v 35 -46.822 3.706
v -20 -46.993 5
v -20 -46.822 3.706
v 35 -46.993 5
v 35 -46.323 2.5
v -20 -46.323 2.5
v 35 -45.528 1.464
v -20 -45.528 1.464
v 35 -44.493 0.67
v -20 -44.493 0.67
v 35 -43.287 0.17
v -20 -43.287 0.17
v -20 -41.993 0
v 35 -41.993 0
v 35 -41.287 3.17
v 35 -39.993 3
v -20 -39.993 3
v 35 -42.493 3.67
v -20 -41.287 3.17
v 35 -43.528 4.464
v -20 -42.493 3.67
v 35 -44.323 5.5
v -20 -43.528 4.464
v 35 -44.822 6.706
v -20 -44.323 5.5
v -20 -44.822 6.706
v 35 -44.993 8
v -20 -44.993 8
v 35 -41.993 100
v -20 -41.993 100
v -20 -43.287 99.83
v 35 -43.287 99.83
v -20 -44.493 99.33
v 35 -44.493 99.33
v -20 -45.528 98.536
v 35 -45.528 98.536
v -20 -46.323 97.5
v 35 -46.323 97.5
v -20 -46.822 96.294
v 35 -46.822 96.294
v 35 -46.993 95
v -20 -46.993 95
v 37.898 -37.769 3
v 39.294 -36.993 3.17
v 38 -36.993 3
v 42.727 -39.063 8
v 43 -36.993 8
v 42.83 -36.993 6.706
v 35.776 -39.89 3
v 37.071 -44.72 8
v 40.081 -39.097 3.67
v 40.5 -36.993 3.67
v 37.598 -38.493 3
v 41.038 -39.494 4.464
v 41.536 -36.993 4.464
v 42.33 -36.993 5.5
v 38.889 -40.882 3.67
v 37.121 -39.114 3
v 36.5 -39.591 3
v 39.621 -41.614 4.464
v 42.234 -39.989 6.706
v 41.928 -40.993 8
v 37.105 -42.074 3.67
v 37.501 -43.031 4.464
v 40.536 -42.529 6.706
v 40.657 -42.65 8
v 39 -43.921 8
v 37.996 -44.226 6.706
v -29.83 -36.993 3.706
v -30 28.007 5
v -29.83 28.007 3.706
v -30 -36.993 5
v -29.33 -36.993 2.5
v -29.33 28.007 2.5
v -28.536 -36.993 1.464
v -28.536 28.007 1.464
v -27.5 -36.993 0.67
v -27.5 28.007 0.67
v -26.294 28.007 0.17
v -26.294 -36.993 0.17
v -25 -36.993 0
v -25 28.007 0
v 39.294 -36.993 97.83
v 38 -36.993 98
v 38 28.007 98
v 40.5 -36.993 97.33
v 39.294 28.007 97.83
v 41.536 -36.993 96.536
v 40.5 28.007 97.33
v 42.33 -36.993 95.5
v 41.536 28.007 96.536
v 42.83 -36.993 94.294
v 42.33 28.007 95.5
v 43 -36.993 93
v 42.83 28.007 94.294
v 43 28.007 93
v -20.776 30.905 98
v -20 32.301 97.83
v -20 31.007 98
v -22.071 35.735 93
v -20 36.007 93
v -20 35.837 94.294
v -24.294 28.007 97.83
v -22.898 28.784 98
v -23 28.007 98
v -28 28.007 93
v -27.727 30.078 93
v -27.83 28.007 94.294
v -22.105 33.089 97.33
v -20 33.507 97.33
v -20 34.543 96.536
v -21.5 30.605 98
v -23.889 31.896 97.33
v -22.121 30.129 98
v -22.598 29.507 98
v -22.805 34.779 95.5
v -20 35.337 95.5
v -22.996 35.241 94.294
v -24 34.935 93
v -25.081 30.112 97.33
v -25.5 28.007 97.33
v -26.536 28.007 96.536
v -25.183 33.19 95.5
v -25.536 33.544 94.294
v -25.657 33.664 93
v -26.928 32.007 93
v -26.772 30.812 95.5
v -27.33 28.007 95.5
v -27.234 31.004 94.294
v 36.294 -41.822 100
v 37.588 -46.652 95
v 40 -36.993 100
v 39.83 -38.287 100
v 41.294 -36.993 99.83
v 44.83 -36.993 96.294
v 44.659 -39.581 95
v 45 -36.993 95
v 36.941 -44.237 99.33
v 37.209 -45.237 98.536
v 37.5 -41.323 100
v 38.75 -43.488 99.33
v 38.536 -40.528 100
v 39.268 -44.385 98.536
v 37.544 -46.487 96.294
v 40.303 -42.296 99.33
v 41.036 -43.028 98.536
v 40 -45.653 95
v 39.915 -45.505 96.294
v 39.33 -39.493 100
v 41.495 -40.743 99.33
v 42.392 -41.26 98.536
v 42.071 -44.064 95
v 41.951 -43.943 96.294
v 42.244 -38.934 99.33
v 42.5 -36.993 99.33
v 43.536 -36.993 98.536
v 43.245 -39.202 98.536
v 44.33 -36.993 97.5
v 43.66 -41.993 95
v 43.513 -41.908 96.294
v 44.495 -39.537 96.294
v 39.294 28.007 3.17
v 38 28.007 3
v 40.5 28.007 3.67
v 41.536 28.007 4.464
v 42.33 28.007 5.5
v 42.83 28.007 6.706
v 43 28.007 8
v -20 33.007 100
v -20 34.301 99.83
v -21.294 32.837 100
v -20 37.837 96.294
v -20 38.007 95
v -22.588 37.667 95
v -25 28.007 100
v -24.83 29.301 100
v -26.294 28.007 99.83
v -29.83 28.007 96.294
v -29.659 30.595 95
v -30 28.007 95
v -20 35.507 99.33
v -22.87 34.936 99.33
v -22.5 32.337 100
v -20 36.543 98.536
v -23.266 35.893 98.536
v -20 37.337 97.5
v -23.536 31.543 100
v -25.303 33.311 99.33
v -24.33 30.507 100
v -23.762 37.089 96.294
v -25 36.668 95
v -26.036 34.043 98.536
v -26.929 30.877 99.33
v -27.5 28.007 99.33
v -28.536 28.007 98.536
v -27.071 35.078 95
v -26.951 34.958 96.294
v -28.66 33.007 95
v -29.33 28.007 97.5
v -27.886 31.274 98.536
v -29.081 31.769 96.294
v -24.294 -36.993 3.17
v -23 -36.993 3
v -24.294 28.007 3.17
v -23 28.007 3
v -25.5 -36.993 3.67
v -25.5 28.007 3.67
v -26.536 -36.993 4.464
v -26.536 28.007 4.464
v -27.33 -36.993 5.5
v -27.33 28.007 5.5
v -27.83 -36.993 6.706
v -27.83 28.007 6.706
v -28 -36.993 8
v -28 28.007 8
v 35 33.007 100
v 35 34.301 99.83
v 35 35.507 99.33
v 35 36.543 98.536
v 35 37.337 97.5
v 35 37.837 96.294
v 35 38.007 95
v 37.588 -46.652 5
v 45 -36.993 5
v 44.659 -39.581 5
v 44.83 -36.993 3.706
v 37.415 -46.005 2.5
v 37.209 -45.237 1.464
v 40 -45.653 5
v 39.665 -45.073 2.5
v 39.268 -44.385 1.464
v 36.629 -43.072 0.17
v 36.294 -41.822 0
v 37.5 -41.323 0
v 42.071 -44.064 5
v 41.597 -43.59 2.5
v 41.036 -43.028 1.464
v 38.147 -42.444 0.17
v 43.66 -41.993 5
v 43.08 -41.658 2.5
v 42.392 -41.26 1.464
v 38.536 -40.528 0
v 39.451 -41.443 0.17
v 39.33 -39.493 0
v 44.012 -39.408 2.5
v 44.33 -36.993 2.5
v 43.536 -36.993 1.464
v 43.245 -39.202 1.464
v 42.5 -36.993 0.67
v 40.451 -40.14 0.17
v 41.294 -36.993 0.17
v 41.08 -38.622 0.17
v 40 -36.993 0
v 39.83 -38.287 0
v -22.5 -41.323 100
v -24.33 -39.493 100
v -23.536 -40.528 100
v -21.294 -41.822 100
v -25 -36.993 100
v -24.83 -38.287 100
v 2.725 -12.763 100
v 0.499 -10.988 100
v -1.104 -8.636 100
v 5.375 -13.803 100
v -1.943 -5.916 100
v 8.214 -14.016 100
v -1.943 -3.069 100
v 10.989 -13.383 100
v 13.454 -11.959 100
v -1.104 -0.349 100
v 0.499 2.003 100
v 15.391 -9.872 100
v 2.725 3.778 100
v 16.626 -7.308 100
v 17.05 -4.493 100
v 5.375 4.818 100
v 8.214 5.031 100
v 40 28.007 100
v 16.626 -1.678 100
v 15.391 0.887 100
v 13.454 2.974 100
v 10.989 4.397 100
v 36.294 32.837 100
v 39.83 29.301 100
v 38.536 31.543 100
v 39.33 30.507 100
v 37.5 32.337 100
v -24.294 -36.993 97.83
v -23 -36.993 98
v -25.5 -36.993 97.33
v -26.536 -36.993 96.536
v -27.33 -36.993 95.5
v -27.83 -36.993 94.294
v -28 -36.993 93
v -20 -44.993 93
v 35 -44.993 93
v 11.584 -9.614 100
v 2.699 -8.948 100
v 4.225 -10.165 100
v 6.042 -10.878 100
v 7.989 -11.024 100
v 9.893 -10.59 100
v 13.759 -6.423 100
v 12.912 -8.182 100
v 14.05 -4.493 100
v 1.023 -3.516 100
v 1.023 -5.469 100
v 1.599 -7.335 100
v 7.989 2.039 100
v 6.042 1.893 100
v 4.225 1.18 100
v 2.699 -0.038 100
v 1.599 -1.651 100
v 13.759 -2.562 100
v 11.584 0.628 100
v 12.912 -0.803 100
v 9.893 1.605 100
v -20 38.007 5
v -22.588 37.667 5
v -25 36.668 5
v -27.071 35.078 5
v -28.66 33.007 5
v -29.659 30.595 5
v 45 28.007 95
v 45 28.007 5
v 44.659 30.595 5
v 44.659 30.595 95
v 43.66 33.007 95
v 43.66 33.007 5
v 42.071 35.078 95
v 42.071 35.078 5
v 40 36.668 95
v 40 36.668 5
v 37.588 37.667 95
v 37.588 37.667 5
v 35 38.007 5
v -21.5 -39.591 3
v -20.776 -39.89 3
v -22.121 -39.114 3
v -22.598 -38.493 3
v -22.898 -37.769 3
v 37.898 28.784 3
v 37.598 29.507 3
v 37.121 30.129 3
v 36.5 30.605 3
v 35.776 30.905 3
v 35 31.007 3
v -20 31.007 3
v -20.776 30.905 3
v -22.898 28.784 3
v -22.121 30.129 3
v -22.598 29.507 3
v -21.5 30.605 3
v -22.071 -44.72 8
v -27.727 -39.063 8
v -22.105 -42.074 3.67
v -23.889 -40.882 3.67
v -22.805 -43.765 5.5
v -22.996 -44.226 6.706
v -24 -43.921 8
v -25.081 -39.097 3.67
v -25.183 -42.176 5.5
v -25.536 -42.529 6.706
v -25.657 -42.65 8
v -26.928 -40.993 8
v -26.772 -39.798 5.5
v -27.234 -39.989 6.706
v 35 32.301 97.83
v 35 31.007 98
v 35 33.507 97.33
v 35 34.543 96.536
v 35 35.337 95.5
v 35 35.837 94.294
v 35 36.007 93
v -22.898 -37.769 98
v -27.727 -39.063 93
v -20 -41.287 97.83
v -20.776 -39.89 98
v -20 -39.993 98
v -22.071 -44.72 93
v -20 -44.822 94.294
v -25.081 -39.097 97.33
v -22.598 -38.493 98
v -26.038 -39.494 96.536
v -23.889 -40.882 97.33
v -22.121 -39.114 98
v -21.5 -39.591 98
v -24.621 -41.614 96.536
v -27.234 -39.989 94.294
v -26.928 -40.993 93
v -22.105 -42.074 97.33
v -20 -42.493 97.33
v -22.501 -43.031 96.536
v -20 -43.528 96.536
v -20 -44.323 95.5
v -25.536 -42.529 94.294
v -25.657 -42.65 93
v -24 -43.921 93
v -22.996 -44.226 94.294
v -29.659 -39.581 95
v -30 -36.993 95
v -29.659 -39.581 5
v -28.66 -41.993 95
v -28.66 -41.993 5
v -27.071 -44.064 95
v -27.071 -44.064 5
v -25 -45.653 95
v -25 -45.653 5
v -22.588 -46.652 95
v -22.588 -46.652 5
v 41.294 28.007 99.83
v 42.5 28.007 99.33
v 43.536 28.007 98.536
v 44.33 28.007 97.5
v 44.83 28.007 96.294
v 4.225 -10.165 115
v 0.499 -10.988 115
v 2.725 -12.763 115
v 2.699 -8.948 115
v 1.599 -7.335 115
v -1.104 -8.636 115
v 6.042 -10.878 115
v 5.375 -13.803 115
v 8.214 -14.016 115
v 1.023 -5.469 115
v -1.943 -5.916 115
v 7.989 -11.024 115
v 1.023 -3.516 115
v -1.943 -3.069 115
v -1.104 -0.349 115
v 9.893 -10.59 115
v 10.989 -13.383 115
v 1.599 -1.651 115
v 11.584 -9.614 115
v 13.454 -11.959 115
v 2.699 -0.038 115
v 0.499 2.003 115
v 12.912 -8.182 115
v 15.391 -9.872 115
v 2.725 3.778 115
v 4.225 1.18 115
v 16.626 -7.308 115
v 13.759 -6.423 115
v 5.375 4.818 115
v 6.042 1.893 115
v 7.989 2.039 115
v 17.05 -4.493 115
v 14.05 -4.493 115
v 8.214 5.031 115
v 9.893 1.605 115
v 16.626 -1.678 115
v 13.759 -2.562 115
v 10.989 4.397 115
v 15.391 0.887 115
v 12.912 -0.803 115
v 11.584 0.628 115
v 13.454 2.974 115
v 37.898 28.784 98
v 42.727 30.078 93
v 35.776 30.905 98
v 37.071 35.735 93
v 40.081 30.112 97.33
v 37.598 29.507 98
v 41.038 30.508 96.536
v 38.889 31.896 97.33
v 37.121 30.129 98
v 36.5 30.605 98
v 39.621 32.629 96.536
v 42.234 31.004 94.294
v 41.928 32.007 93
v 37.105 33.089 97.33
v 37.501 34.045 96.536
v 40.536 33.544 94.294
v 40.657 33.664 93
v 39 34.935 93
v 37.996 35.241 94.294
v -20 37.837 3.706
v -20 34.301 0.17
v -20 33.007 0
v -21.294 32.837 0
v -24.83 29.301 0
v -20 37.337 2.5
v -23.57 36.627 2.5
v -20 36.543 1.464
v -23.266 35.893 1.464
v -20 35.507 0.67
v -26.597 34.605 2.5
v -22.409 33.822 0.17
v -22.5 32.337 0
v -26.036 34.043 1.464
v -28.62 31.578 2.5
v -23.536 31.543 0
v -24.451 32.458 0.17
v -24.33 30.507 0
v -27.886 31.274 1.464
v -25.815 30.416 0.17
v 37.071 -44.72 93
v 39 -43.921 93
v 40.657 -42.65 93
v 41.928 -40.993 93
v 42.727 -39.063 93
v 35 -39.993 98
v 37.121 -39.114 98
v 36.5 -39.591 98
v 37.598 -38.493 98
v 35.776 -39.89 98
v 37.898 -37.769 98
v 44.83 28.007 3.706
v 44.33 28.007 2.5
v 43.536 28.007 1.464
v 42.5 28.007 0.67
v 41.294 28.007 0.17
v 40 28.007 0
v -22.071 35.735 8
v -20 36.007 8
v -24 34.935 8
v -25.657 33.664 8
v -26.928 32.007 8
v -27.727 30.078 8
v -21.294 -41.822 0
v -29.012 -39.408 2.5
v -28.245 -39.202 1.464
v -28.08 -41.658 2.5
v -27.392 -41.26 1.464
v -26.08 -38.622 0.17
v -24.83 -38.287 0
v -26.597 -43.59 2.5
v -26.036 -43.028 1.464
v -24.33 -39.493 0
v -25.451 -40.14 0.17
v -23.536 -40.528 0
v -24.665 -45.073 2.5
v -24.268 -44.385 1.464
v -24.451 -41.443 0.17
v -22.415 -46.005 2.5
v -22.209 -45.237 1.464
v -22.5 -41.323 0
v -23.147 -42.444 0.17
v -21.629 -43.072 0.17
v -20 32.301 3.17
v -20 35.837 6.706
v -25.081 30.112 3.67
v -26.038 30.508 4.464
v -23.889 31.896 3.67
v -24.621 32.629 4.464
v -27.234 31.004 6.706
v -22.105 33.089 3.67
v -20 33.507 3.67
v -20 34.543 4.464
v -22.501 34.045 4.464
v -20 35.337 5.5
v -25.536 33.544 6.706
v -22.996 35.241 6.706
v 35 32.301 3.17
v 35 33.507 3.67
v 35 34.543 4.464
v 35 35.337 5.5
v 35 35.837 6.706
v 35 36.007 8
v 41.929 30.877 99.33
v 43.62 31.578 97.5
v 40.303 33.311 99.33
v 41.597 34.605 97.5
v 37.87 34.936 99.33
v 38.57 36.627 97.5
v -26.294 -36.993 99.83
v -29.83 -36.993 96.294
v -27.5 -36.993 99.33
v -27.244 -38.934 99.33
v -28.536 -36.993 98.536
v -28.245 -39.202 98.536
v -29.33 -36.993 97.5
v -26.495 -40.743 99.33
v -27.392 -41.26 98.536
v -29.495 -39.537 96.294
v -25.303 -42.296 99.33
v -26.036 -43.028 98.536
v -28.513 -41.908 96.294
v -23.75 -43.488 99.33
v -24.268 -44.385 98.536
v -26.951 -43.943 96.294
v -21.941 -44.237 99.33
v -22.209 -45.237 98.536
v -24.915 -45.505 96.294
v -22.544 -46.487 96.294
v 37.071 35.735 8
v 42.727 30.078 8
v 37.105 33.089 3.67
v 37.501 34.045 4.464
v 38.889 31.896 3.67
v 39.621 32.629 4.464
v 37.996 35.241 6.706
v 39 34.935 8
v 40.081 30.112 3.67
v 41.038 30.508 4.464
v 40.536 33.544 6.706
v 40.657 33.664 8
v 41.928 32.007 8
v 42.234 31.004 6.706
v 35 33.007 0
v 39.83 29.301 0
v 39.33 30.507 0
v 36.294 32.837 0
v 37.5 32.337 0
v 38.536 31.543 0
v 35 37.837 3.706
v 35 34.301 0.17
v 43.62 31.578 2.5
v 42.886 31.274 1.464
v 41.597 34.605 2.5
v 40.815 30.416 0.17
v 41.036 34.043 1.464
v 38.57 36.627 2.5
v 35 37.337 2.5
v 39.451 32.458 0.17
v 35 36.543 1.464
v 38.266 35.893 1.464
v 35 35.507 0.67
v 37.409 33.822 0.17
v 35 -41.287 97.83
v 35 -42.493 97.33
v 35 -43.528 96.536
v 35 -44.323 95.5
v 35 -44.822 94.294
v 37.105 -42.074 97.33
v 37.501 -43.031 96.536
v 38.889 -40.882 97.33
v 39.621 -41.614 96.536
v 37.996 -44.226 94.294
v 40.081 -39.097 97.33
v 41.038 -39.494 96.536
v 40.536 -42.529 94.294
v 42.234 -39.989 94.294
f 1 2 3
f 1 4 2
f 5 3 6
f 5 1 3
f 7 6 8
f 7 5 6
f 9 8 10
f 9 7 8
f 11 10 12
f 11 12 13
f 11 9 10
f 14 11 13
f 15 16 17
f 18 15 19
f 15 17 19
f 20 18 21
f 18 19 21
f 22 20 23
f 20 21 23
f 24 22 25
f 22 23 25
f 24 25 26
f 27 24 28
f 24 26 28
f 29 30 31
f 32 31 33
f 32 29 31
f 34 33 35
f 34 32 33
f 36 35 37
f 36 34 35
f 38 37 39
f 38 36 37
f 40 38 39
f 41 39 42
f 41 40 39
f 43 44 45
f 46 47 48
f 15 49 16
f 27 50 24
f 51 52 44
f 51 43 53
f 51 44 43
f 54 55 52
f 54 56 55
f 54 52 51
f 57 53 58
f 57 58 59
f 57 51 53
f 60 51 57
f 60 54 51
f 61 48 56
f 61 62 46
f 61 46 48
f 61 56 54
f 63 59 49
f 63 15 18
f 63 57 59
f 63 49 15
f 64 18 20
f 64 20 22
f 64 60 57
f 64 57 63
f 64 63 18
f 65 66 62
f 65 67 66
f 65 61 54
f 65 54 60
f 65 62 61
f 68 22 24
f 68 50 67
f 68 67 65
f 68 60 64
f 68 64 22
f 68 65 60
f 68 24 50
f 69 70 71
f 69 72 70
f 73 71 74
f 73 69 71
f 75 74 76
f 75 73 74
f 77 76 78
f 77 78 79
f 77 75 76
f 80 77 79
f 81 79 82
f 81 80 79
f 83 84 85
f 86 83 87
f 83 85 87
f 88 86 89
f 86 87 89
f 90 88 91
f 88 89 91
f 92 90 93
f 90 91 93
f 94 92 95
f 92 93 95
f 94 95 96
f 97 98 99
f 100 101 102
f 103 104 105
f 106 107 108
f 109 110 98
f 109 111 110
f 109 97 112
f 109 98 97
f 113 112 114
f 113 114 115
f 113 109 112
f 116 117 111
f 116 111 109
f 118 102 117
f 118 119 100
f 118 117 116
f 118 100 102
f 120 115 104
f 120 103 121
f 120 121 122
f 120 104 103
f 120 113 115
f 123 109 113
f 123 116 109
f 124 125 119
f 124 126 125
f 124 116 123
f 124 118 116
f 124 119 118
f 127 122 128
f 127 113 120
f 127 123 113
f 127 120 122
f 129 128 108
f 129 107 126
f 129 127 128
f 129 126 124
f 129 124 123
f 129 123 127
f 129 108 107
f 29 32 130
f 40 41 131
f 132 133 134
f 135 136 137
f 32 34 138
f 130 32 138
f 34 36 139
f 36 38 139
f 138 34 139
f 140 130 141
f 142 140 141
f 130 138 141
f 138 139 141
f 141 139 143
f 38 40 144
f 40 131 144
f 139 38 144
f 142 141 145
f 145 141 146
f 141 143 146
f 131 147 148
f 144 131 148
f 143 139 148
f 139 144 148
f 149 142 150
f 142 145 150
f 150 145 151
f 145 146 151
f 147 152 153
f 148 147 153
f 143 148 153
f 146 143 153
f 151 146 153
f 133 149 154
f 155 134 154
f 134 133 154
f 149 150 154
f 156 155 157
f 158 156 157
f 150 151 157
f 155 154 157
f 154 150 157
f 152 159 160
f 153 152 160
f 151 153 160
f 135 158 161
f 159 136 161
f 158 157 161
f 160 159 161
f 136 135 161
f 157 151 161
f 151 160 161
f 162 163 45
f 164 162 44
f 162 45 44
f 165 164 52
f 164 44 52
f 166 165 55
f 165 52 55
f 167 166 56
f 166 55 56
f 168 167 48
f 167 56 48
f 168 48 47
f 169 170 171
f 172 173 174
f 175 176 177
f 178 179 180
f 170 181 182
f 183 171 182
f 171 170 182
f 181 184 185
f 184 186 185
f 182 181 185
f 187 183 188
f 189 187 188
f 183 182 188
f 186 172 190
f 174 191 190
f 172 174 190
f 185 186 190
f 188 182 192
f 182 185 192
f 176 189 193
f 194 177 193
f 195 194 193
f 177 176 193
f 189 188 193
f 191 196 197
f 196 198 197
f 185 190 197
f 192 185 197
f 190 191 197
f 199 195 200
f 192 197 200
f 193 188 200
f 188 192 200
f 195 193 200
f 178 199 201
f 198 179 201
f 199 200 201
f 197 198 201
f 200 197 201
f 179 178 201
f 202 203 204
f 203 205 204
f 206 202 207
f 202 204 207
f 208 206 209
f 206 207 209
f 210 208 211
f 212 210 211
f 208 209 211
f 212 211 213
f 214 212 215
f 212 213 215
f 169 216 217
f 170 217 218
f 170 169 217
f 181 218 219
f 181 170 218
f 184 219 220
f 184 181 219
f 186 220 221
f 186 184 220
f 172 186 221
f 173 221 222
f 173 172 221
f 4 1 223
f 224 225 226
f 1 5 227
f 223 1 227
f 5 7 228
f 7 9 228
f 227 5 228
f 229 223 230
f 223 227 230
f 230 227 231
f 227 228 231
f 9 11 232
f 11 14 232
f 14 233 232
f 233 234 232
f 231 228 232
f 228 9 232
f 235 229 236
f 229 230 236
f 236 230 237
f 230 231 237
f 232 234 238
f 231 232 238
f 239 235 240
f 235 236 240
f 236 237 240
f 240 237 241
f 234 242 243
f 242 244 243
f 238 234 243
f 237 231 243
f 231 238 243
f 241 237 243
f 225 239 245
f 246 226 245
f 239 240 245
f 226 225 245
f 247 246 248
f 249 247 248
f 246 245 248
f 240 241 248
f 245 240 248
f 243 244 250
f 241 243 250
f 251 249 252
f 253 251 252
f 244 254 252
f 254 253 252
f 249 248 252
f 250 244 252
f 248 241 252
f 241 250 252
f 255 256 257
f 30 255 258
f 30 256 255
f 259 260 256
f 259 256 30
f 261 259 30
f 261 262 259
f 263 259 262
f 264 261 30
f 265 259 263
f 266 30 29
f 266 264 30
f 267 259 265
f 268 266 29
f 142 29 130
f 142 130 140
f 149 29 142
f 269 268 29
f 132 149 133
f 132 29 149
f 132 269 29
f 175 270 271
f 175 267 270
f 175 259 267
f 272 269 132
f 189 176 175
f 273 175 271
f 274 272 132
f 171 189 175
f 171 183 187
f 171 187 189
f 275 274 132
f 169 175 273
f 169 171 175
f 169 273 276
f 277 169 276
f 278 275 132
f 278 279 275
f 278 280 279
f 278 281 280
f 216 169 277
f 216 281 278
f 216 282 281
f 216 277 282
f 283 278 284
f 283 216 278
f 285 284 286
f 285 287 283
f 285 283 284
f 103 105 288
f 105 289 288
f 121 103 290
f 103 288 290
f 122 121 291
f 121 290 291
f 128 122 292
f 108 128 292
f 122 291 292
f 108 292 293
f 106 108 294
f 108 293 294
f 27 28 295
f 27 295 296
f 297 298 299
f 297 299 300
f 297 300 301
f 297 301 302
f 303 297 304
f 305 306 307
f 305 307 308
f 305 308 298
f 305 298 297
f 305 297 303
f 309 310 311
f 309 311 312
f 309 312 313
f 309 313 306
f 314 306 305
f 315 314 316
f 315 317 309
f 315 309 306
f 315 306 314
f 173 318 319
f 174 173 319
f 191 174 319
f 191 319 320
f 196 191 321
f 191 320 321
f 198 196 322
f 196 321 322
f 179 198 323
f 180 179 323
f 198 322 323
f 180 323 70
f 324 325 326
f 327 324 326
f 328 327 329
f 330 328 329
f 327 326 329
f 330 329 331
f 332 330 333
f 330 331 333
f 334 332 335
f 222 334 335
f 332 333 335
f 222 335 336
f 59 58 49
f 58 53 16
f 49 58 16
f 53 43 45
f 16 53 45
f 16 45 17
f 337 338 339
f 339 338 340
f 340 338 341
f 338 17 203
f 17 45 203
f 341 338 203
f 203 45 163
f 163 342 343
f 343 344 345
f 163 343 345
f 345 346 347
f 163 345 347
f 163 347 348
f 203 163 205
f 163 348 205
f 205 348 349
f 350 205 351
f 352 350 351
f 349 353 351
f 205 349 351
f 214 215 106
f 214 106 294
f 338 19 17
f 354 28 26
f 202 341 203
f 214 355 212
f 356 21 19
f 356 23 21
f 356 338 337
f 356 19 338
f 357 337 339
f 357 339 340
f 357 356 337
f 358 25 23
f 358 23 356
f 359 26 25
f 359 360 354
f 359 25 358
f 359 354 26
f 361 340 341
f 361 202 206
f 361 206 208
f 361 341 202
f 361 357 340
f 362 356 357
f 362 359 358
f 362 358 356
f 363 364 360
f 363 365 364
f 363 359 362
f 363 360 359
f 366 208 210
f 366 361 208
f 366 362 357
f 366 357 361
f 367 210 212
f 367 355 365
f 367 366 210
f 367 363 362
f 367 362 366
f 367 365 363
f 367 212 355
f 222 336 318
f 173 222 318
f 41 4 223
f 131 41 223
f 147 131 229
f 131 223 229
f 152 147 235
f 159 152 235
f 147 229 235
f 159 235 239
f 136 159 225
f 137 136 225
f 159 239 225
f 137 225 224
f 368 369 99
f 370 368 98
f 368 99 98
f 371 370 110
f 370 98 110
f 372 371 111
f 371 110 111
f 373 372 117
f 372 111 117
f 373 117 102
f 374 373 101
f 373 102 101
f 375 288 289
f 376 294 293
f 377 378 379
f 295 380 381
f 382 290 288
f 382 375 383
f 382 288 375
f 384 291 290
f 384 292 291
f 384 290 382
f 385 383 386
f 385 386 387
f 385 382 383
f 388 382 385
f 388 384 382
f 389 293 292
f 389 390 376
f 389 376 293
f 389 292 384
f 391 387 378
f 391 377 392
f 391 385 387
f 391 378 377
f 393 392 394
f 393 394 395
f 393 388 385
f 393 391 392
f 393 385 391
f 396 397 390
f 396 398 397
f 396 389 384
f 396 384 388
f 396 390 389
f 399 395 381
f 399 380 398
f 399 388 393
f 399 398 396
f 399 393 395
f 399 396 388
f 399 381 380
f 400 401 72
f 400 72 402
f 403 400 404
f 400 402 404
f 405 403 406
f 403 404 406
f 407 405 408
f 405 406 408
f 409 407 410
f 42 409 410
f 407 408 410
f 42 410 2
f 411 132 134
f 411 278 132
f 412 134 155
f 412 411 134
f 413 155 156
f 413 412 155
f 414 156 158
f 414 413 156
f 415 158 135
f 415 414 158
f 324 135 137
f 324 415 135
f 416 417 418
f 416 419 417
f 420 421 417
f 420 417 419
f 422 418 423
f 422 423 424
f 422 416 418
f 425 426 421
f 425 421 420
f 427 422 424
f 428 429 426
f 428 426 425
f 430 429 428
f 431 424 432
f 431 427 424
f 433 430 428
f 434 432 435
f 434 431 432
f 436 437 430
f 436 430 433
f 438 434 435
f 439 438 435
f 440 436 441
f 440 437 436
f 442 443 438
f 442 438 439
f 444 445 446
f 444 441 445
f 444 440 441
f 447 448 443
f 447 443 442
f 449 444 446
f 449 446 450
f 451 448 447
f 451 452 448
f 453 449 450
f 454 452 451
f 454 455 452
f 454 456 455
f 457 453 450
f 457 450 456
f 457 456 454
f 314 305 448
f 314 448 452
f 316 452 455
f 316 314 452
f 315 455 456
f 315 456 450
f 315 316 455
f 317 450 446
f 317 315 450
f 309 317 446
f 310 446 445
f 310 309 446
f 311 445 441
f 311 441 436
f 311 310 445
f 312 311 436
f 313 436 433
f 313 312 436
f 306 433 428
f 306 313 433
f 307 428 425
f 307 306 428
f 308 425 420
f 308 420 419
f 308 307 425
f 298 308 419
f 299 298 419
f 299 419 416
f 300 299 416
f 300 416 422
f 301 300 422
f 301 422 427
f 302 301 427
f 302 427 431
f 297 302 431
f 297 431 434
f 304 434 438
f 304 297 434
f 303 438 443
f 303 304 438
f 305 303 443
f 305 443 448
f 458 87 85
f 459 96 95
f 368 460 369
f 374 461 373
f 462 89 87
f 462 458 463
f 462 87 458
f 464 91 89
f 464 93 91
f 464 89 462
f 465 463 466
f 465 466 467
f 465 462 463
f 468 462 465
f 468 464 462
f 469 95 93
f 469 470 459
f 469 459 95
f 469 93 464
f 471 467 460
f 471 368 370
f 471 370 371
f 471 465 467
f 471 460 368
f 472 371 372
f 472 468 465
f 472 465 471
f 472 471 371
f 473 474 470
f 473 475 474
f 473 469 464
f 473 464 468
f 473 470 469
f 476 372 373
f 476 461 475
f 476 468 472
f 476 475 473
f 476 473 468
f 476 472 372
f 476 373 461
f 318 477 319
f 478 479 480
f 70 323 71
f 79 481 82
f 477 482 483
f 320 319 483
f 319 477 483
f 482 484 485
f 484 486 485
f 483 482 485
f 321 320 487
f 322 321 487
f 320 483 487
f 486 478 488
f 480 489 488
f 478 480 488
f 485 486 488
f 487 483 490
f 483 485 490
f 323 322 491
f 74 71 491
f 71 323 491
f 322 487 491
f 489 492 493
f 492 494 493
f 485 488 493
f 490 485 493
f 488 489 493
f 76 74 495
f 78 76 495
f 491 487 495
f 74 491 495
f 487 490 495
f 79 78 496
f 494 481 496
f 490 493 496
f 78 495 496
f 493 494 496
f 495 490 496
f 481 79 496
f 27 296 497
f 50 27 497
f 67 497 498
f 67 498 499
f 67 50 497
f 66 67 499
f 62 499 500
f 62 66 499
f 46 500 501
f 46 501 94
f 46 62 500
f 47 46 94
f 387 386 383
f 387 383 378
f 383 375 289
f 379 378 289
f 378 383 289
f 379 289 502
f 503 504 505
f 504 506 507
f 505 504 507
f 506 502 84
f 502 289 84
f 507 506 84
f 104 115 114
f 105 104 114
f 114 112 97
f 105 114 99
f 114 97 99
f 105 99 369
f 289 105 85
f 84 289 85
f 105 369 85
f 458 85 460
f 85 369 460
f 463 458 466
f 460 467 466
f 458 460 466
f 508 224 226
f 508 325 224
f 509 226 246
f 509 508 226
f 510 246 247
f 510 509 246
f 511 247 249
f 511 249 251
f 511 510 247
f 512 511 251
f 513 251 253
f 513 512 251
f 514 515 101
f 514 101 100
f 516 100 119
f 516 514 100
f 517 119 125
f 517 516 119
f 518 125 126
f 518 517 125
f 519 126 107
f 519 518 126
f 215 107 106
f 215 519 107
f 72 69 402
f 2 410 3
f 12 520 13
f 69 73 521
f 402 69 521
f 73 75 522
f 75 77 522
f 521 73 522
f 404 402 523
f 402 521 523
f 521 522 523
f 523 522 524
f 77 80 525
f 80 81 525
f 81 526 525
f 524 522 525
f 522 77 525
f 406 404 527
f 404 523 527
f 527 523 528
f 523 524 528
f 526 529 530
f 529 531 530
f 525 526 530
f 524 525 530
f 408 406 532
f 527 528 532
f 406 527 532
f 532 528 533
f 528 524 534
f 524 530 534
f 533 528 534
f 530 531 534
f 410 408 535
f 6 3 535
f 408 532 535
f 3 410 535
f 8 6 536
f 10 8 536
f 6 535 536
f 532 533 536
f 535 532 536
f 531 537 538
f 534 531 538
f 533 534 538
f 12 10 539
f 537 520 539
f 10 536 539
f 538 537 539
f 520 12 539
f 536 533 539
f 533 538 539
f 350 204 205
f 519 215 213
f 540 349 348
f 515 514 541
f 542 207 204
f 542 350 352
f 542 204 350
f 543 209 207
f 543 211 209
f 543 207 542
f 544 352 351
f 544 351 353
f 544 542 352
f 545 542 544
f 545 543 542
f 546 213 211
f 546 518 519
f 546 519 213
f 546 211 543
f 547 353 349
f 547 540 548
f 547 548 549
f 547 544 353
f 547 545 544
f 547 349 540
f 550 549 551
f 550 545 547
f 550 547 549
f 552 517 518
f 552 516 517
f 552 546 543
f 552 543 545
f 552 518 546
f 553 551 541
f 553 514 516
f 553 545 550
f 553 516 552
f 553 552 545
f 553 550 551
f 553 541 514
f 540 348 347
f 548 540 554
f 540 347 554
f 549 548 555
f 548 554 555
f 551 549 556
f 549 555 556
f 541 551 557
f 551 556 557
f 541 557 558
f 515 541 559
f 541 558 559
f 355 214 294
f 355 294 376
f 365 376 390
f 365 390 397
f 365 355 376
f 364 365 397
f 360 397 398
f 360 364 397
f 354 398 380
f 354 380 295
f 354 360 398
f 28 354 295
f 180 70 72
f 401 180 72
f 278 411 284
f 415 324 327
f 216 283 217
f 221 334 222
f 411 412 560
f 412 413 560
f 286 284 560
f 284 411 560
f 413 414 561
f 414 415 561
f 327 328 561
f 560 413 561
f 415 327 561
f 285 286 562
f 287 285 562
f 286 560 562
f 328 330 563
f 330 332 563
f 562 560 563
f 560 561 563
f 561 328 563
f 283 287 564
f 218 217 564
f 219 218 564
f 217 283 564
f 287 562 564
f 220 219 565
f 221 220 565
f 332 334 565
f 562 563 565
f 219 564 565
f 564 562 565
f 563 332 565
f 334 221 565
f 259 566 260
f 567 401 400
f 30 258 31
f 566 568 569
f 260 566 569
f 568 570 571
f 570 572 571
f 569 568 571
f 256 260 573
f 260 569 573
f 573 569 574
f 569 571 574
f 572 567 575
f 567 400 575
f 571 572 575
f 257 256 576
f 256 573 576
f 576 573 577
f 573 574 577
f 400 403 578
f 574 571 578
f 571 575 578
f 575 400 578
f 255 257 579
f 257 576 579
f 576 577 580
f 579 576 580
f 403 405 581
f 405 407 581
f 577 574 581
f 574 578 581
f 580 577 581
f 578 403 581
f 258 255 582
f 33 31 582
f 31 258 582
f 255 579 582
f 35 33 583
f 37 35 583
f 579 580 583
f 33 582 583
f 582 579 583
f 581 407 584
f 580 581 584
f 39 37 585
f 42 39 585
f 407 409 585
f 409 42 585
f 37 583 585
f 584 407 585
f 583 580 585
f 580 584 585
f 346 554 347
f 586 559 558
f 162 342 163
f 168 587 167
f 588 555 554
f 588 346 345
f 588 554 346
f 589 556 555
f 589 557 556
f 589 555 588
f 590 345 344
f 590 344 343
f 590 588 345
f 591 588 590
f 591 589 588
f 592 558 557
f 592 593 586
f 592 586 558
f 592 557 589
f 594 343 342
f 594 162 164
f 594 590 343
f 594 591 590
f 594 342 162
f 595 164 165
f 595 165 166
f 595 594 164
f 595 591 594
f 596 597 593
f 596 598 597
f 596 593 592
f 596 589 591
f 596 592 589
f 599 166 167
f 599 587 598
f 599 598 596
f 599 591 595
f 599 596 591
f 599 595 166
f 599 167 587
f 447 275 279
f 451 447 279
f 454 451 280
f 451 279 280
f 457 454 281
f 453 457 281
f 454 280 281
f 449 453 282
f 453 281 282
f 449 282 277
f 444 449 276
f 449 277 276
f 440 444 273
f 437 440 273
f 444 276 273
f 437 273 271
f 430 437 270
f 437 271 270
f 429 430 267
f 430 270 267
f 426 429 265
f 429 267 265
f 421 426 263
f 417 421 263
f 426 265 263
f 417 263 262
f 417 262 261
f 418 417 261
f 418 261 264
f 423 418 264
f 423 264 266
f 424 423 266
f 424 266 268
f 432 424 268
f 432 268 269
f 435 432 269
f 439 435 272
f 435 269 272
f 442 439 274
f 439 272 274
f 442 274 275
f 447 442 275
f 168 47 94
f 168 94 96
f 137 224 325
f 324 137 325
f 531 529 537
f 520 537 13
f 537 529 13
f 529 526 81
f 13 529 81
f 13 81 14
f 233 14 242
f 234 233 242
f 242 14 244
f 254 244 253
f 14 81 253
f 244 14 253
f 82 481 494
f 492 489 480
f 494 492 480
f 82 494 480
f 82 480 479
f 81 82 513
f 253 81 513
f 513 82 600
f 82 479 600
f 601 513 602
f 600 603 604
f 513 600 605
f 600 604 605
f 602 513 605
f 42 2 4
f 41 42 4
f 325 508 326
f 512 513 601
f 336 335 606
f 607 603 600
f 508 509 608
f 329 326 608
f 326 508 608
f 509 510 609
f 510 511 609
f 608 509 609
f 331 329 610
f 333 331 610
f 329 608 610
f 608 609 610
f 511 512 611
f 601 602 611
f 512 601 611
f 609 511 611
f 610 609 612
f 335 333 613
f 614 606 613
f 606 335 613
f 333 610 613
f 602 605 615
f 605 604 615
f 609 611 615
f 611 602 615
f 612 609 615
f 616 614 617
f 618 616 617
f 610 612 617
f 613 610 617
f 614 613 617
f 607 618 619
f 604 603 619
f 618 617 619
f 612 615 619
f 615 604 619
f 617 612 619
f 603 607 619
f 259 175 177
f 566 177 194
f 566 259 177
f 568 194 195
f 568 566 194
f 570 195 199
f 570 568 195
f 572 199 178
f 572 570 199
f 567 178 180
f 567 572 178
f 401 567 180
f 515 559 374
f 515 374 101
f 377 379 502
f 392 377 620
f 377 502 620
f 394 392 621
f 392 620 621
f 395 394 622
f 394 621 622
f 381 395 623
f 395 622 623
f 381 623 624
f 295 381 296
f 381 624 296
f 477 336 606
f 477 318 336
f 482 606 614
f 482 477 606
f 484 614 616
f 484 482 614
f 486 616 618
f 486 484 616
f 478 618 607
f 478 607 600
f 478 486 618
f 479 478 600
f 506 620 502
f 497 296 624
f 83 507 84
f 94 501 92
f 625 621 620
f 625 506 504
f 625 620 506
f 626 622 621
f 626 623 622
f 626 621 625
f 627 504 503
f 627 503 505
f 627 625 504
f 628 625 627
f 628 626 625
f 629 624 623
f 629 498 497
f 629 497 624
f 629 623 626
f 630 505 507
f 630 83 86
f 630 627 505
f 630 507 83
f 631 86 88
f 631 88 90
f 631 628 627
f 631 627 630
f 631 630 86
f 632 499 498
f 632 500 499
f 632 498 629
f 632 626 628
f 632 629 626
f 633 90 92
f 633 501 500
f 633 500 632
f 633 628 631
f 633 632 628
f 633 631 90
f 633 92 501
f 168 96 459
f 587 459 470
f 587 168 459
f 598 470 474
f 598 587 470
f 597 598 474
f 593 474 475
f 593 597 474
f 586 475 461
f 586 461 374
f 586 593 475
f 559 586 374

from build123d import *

# Parameters (mm, degrees)
BOSS_EXTRUDE1_DEPTH = 100
BOSS_EXTRUDE2_DEPTH = 3
BOSS_EXTRUDE3_START = -2
BOSS_EXTRUDE3_DEPTH = 2
FILLET2_R           = 5
SKETCH5_R           = 9.55
SKETCH5_R_2         = 6.55
BOSS_EXTRUDE4_DEPTH = 15


with BuildPart() as part:
    # Sketch1 → Boss-Extrude1 (new body)
    with BuildSketch(Plane.XY):
        with BuildLine():
            Line((-20, -46.992716482), (35, -46.992716482))
            ThreePointArc((35, -46.992716482), (42.071067812, -44.063784293), (45, -36.992716482))
            Line((45, -36.992716482), (45, 28.007283518))
            ThreePointArc((45, 28.007283518), (42.071067812, 35.07835133), (35, 38.007283518))
            Line((35, 38.007283518), (-20, 38.007283518))
            ThreePointArc((-20, 38.007283518), (-27.071067812, 35.07835133), (-30, 28.007283518))
            Line((-30, 28.007283518), (-30, -36.992716482))
            ThreePointArc((-30, -36.992716482), (-27.071067812, -44.063784293), (-20, -46.992716482))
        make_face()
        with BuildLine():
            Line((-20, -44.992716482), (35, -44.992716482))
            ThreePointArc((35, -44.992716482), (40.656854249, -42.649570731), (43, -36.992716482))
            Line((43, -36.992716482), (43, 28.007283518))
            ThreePointArc((43, 28.007283518), (40.656854249, 33.664137768), (35, 36.007283518))
            Line((35, 36.007283518), (-20, 36.007283518))
            ThreePointArc((-20, 36.007283518), (-25.656854249, 33.664137768), (-28, 28.007283518))
            Line((-28, 28.007283518), (-28, -36.992716482))
            ThreePointArc((-28, -36.992716482), (-25.656854249, -42.649570731), (-20, -44.992716482))
        make_face(mode=Mode.SUBTRACT)
    extrude(amount=BOSS_EXTRUDE1_DEPTH)

    # Sketch2 → Boss-Extrude2 (add)
    with BuildSketch(Plane(origin=(0, 0, 0), x_dir=(-1, 0, 0), z_dir=(0, 0, -1))):
        with BuildLine():
            Line((-35, -46.992716482), (20, -46.992716482))
            ThreePointArc((20, -46.992716482), (27.071067812, -44.063784293), (30, -36.992716482))
            Line((30, -36.992716482), (30, 28.007283518))
            ThreePointArc((30, 28.007283518), (27.071067812, 35.07835133), (20, 38.007283518))
            Line((20, 38.007283518), (-35, 38.007283518))
            ThreePointArc((-35, 38.007283518), (-42.071067812, 35.07835133), (-45, 28.007283518))
            Line((-45, 28.007283518), (-45, -36.992716482))
            ThreePointArc((-45, -36.992716482), (-42.071067812, -44.063784293), (-35, -46.992716482))
        make_face()
    extrude(amount=-BOSS_EXTRUDE2_DEPTH)

    # Sketch4 → Boss-Extrude3 (add)
    with BuildSketch(Plane.XY.offset(100).offset(BOSS_EXTRUDE3_START)):
        with BuildLine():
            Line((-20, -46.992716482), (35, -46.992716482))
            ThreePointArc((35, -46.992716482), (42.071067812, -44.063784293), (45, -36.992716482))
            Line((45, -36.992716482), (45, 28.007283518))
            ThreePointArc((45, 28.007283518), (42.071067812, 35.07835133), (35, 38.007283518))
            Line((35, 38.007283518), (-20, 38.007283518))
            ThreePointArc((-20, 38.007283518), (-27.071067812, 35.07835133), (-30, 28.007283518))
            Line((-30, 28.007283518), (-30, -36.992716482))
            ThreePointArc((-30, -36.992716482), (-27.071067812, -44.063784293), (-20, -46.992716482))
        make_face()
    extrude(amount=BOSS_EXTRUDE3_DEPTH)

    # Fillet2
    fillet2_edges = [part.edges().sort_by_distance(p)[0] for p in [
        (7.5, 38.007283518, 0),
        (-28, -4.492716482, 98),
        (-25.656854249, -42.649570731, 98),
        (7.5, -44.992716482, 98),
        (40.656854249, -42.649570731, 98),
        (43, -4.492716482, 98),
        (40.656854249, 33.664137768, 98),
        (42.071067812, 35.07835133, 0),
        (7.5, 36.007283518, 98),
        (-25.656854249, 33.664137768, 98),
        (45, -4.492716482, 0),
        (42.071067812, -44.063784293, 0),
        (42.071067812, 35.07835133, 100),
        (7.5, 38.007283518, 100),
        (-27.071067812, 35.07835133, 100),
        (-30, -4.492716482, 100),
        (-27.071067812, -44.063784293, 100),
        (7.5, -46.992716482, 100),
        (42.071067812, -44.063784293, 100),
        (-28, -4.492716482, 3),
        (7.5, -44.992716482, 3),
        (-25.656854249, -42.649570731, 3),
        (-25.656854249, 33.664137768, 3),
        (7.5, 36.007283518, 3),
        (40.656854249, 33.664137768, 3),
        (43, -4.492716482, 3),
        (40.656854249, -42.649570731, 3),
        (7.5, -46.992716482, 0),
        (45, -4.492716482, 100),
        (-27.071067812, -44.063784293, 0),
        (-30, -4.492716482, 0),
        (-27.071067812, 35.07835133, 0),
    ]]
    fillet(fillet2_edges, radius=FILLET2_R)

    # Sketch5 → Boss-Extrude4 (add)
    with BuildSketch(Plane.XY.offset(100)):
        with Locations((7.5, -4.492716482)):
            Circle(SKETCH5_R)
        with Locations((7.5, -4.492716482)):
            Circle(SKETCH5_R_2, mode=Mode.SUBTRACT)
    extrude(amount=BOSS_EXTRUDE4_DEPTH)


solid = part.part
